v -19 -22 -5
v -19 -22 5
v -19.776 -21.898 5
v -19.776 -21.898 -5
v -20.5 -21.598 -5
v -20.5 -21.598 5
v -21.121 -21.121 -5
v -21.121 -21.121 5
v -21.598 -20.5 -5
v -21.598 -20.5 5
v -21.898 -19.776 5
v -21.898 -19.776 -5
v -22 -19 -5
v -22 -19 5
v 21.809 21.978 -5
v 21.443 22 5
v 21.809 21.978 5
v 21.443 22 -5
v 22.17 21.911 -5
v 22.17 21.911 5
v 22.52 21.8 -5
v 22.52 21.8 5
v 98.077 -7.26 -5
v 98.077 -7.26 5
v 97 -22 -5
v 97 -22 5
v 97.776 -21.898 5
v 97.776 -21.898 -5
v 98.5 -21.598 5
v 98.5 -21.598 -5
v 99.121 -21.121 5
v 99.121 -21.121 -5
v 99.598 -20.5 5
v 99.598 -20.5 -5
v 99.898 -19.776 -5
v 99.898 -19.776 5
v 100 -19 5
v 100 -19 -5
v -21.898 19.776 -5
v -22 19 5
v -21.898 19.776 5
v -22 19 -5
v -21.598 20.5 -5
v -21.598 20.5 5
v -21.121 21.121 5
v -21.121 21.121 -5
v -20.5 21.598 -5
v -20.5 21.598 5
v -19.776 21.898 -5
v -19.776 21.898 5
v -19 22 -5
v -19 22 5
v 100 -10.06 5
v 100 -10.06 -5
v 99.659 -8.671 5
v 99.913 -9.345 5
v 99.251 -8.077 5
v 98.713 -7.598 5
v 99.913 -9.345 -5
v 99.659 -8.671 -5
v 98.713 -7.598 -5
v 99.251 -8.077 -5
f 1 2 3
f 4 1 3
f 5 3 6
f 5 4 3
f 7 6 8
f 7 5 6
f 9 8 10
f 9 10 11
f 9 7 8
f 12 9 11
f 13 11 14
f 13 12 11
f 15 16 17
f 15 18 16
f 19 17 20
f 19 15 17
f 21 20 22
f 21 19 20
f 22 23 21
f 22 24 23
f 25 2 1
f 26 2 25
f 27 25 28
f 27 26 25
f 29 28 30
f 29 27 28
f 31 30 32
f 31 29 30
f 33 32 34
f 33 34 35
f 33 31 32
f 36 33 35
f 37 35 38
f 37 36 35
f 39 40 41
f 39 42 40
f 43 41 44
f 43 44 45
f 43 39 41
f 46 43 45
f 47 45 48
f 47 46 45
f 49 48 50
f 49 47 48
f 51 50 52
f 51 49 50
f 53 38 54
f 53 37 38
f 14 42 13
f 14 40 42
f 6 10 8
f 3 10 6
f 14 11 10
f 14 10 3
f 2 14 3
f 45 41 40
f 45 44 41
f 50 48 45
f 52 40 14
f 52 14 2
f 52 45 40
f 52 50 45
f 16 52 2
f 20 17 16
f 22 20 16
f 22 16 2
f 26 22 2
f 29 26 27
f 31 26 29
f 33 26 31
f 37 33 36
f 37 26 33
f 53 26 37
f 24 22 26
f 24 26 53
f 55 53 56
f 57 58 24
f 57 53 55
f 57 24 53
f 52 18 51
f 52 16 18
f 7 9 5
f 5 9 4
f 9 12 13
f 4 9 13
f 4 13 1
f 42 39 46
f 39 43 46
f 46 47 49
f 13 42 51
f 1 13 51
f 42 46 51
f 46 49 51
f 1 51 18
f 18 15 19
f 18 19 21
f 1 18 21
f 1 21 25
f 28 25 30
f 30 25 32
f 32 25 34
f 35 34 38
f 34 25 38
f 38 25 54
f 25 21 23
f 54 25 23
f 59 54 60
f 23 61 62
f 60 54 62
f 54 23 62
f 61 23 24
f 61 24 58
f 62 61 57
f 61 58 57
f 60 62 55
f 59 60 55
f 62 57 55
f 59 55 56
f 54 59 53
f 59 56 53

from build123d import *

# Parameters (mm, degrees)
EXTRUDE_436_DEPTH = 5
FILLET_R_R        = 3


with BuildPart() as part:
    # ｽｹｯﾁ1 → Extrude 436 (new, symmetric)
    with BuildSketch(Plane.XY):
        Polygon((-22, -22), (100, -22), (100, -8), (22, 22), (-22, 22), align=None)
    extrude(amount=EXTRUDE_436_DEPTH, both=True)

    # 角R
    fillet_r_edges = [part.edges().sort_by_distance(p)[0] for p in [
        (-22, 22, 0),
        (22, 22, 0),
        (100, -8, 0),
        (100, -22, 0),
        (-22, -22, 0),
    ]]
    fillet(fillet_r_edges, radius=FILLET_R_R)


solid = part.part
